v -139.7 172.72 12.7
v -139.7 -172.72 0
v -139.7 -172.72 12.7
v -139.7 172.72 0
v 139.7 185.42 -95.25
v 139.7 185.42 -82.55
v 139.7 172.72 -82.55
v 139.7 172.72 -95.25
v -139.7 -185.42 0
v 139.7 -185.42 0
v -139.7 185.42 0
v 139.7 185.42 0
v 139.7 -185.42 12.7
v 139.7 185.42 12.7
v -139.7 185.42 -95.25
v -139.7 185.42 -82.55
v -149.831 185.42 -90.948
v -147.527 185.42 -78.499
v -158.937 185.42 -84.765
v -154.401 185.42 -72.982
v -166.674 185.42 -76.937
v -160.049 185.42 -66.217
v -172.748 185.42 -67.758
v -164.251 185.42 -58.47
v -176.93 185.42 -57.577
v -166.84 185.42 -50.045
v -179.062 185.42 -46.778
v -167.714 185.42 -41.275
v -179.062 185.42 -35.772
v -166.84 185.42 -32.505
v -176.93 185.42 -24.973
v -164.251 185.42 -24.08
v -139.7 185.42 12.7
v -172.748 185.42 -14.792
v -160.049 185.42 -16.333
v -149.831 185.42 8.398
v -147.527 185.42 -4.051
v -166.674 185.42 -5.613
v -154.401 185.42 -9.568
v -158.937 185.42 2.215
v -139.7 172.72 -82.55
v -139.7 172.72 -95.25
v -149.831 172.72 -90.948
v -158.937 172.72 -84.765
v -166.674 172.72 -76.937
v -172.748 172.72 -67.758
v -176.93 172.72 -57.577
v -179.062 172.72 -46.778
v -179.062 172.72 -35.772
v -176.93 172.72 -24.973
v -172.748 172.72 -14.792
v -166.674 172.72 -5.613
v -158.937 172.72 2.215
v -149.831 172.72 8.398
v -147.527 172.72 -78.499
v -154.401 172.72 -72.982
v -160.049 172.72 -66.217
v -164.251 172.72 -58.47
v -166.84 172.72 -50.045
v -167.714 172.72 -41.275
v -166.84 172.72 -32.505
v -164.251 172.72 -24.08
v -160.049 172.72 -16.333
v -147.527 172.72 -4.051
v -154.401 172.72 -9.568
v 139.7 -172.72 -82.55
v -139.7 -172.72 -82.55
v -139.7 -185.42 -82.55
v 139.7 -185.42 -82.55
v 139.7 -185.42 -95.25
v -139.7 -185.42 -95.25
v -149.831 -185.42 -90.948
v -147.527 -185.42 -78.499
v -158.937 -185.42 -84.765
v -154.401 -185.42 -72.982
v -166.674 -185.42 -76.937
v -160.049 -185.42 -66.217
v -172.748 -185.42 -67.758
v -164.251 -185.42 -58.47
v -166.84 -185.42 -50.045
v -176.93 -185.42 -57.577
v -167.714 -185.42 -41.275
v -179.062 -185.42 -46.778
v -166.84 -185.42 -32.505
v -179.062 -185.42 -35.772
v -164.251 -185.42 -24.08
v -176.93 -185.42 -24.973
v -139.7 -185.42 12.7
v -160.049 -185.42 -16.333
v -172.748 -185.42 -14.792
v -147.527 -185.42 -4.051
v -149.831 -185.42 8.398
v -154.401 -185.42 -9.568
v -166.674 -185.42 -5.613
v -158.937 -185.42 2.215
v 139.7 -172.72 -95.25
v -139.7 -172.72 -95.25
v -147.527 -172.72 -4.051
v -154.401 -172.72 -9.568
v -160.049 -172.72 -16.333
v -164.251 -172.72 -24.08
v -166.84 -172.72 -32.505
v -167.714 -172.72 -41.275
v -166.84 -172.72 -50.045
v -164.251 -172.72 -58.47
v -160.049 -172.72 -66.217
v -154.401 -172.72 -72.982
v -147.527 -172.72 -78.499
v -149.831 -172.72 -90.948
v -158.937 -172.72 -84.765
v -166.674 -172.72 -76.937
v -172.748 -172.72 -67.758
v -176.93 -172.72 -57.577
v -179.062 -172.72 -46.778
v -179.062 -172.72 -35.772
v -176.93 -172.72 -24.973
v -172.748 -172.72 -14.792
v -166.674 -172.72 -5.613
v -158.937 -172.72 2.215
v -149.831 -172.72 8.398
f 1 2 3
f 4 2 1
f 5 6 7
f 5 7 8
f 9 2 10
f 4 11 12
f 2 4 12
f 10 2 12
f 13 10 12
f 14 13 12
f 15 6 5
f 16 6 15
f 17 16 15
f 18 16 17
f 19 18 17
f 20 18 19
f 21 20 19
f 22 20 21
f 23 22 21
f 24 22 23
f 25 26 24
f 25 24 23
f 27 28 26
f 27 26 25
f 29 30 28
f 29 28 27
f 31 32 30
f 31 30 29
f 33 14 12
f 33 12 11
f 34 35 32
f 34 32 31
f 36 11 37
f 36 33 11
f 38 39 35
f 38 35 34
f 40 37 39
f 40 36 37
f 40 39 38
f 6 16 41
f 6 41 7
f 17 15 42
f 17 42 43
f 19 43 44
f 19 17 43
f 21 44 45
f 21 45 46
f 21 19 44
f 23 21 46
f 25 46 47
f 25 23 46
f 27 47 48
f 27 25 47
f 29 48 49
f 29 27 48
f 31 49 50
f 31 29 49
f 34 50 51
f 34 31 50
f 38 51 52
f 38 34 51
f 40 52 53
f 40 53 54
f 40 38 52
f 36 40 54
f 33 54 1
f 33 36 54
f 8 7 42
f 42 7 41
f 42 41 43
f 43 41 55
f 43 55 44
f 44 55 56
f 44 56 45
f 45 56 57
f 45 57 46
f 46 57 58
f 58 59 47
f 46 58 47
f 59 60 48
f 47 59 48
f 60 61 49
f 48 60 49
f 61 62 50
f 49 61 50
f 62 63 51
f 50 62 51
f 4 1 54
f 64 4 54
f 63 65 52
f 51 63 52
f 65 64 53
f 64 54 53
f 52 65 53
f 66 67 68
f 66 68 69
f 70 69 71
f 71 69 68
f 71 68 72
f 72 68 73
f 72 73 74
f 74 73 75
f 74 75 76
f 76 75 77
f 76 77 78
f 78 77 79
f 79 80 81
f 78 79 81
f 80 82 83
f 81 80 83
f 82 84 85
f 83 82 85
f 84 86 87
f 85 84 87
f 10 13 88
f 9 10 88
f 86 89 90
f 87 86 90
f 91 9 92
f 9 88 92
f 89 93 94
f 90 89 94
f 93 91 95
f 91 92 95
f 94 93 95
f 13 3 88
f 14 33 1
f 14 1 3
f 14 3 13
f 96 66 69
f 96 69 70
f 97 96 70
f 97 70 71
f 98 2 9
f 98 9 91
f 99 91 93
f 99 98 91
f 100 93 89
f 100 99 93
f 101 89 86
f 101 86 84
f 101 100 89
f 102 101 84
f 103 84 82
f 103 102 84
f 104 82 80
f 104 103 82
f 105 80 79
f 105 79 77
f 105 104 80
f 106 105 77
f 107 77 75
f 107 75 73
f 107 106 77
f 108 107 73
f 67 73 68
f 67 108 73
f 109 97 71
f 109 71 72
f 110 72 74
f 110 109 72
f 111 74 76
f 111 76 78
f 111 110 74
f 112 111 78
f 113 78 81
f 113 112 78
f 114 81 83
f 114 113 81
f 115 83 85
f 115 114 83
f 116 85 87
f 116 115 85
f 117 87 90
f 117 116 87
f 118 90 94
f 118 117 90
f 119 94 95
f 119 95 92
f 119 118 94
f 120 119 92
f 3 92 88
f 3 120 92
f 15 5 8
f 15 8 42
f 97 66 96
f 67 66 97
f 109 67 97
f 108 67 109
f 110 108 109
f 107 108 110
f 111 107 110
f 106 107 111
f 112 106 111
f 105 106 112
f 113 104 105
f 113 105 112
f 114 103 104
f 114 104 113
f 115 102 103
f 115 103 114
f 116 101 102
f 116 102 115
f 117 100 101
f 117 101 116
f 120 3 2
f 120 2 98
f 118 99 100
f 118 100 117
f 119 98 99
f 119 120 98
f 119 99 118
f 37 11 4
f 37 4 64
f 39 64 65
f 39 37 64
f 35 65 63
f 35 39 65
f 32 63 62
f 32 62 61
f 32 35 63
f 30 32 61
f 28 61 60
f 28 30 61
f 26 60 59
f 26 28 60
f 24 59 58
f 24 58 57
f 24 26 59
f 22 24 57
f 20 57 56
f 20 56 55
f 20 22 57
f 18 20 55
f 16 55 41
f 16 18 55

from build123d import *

# Parameters (mm, degrees)
F0_W     = 279.4
F0_H     = 370.84
F1_DEPTH = 12.7
F3_DEPTH = 12.7
F4_START = -358.14
F4_DEPTH = 12.7


with BuildPart() as f1:
    # F0 (on Top) → F1 (new body)
    with BuildSketch(Plane.XY):
        Rectangle(F0_W, F0_H)
    extrude(amount=F1_DEPTH)

    # F2 (on face) → F3 (join)
    with BuildSketch(Plane(origin=(0, 185.42, 0), x_dir=(-1, 0, 0), z_dir=(0, 1, 0))):
        with BuildLine():
            Line((-139.7, -82.55), (-139.7, -95.25))
            Line((-139.7, -95.25), (139.7, -95.25))
            ThreePointArc((139.7, -95.25), (179.3299440444, -41.275), (139.7, 12.7))
            Line((139.7, 12.7), (139.7, 0))
            ThreePointArc((139.7, 0), (167.7143480452, -41.275), (139.7, -82.55))
            Line((139.7, -82.55), (-139.7, -82.55))
        make_face()
    extrude(amount=-F3_DEPTH)

    # F2 (on face) → F4 (join)
    with BuildSketch(Plane(origin=(0, 185.42, 0), x_dir=(-1, 0, 0), z_dir=(0, 1, 0)).offset(F4_START)):
        with BuildLine():
            Line((-139.7, -82.55), (-139.7, -95.25))
            Line((-139.7, -95.25), (139.7, -95.25))
            ThreePointArc((139.7, -95.25), (179.3299440444, -41.275), (139.7, 12.7))
            Line((139.7, 12.7), (139.7, 0))
            ThreePointArc((139.7, 0), (167.7143480452, -41.275), (139.7, -82.55))
            Line((139.7, -82.55), (-139.7, -82.55))
        make_face()
    extrude(amount=-F4_DEPTH)


solid = f1.part
